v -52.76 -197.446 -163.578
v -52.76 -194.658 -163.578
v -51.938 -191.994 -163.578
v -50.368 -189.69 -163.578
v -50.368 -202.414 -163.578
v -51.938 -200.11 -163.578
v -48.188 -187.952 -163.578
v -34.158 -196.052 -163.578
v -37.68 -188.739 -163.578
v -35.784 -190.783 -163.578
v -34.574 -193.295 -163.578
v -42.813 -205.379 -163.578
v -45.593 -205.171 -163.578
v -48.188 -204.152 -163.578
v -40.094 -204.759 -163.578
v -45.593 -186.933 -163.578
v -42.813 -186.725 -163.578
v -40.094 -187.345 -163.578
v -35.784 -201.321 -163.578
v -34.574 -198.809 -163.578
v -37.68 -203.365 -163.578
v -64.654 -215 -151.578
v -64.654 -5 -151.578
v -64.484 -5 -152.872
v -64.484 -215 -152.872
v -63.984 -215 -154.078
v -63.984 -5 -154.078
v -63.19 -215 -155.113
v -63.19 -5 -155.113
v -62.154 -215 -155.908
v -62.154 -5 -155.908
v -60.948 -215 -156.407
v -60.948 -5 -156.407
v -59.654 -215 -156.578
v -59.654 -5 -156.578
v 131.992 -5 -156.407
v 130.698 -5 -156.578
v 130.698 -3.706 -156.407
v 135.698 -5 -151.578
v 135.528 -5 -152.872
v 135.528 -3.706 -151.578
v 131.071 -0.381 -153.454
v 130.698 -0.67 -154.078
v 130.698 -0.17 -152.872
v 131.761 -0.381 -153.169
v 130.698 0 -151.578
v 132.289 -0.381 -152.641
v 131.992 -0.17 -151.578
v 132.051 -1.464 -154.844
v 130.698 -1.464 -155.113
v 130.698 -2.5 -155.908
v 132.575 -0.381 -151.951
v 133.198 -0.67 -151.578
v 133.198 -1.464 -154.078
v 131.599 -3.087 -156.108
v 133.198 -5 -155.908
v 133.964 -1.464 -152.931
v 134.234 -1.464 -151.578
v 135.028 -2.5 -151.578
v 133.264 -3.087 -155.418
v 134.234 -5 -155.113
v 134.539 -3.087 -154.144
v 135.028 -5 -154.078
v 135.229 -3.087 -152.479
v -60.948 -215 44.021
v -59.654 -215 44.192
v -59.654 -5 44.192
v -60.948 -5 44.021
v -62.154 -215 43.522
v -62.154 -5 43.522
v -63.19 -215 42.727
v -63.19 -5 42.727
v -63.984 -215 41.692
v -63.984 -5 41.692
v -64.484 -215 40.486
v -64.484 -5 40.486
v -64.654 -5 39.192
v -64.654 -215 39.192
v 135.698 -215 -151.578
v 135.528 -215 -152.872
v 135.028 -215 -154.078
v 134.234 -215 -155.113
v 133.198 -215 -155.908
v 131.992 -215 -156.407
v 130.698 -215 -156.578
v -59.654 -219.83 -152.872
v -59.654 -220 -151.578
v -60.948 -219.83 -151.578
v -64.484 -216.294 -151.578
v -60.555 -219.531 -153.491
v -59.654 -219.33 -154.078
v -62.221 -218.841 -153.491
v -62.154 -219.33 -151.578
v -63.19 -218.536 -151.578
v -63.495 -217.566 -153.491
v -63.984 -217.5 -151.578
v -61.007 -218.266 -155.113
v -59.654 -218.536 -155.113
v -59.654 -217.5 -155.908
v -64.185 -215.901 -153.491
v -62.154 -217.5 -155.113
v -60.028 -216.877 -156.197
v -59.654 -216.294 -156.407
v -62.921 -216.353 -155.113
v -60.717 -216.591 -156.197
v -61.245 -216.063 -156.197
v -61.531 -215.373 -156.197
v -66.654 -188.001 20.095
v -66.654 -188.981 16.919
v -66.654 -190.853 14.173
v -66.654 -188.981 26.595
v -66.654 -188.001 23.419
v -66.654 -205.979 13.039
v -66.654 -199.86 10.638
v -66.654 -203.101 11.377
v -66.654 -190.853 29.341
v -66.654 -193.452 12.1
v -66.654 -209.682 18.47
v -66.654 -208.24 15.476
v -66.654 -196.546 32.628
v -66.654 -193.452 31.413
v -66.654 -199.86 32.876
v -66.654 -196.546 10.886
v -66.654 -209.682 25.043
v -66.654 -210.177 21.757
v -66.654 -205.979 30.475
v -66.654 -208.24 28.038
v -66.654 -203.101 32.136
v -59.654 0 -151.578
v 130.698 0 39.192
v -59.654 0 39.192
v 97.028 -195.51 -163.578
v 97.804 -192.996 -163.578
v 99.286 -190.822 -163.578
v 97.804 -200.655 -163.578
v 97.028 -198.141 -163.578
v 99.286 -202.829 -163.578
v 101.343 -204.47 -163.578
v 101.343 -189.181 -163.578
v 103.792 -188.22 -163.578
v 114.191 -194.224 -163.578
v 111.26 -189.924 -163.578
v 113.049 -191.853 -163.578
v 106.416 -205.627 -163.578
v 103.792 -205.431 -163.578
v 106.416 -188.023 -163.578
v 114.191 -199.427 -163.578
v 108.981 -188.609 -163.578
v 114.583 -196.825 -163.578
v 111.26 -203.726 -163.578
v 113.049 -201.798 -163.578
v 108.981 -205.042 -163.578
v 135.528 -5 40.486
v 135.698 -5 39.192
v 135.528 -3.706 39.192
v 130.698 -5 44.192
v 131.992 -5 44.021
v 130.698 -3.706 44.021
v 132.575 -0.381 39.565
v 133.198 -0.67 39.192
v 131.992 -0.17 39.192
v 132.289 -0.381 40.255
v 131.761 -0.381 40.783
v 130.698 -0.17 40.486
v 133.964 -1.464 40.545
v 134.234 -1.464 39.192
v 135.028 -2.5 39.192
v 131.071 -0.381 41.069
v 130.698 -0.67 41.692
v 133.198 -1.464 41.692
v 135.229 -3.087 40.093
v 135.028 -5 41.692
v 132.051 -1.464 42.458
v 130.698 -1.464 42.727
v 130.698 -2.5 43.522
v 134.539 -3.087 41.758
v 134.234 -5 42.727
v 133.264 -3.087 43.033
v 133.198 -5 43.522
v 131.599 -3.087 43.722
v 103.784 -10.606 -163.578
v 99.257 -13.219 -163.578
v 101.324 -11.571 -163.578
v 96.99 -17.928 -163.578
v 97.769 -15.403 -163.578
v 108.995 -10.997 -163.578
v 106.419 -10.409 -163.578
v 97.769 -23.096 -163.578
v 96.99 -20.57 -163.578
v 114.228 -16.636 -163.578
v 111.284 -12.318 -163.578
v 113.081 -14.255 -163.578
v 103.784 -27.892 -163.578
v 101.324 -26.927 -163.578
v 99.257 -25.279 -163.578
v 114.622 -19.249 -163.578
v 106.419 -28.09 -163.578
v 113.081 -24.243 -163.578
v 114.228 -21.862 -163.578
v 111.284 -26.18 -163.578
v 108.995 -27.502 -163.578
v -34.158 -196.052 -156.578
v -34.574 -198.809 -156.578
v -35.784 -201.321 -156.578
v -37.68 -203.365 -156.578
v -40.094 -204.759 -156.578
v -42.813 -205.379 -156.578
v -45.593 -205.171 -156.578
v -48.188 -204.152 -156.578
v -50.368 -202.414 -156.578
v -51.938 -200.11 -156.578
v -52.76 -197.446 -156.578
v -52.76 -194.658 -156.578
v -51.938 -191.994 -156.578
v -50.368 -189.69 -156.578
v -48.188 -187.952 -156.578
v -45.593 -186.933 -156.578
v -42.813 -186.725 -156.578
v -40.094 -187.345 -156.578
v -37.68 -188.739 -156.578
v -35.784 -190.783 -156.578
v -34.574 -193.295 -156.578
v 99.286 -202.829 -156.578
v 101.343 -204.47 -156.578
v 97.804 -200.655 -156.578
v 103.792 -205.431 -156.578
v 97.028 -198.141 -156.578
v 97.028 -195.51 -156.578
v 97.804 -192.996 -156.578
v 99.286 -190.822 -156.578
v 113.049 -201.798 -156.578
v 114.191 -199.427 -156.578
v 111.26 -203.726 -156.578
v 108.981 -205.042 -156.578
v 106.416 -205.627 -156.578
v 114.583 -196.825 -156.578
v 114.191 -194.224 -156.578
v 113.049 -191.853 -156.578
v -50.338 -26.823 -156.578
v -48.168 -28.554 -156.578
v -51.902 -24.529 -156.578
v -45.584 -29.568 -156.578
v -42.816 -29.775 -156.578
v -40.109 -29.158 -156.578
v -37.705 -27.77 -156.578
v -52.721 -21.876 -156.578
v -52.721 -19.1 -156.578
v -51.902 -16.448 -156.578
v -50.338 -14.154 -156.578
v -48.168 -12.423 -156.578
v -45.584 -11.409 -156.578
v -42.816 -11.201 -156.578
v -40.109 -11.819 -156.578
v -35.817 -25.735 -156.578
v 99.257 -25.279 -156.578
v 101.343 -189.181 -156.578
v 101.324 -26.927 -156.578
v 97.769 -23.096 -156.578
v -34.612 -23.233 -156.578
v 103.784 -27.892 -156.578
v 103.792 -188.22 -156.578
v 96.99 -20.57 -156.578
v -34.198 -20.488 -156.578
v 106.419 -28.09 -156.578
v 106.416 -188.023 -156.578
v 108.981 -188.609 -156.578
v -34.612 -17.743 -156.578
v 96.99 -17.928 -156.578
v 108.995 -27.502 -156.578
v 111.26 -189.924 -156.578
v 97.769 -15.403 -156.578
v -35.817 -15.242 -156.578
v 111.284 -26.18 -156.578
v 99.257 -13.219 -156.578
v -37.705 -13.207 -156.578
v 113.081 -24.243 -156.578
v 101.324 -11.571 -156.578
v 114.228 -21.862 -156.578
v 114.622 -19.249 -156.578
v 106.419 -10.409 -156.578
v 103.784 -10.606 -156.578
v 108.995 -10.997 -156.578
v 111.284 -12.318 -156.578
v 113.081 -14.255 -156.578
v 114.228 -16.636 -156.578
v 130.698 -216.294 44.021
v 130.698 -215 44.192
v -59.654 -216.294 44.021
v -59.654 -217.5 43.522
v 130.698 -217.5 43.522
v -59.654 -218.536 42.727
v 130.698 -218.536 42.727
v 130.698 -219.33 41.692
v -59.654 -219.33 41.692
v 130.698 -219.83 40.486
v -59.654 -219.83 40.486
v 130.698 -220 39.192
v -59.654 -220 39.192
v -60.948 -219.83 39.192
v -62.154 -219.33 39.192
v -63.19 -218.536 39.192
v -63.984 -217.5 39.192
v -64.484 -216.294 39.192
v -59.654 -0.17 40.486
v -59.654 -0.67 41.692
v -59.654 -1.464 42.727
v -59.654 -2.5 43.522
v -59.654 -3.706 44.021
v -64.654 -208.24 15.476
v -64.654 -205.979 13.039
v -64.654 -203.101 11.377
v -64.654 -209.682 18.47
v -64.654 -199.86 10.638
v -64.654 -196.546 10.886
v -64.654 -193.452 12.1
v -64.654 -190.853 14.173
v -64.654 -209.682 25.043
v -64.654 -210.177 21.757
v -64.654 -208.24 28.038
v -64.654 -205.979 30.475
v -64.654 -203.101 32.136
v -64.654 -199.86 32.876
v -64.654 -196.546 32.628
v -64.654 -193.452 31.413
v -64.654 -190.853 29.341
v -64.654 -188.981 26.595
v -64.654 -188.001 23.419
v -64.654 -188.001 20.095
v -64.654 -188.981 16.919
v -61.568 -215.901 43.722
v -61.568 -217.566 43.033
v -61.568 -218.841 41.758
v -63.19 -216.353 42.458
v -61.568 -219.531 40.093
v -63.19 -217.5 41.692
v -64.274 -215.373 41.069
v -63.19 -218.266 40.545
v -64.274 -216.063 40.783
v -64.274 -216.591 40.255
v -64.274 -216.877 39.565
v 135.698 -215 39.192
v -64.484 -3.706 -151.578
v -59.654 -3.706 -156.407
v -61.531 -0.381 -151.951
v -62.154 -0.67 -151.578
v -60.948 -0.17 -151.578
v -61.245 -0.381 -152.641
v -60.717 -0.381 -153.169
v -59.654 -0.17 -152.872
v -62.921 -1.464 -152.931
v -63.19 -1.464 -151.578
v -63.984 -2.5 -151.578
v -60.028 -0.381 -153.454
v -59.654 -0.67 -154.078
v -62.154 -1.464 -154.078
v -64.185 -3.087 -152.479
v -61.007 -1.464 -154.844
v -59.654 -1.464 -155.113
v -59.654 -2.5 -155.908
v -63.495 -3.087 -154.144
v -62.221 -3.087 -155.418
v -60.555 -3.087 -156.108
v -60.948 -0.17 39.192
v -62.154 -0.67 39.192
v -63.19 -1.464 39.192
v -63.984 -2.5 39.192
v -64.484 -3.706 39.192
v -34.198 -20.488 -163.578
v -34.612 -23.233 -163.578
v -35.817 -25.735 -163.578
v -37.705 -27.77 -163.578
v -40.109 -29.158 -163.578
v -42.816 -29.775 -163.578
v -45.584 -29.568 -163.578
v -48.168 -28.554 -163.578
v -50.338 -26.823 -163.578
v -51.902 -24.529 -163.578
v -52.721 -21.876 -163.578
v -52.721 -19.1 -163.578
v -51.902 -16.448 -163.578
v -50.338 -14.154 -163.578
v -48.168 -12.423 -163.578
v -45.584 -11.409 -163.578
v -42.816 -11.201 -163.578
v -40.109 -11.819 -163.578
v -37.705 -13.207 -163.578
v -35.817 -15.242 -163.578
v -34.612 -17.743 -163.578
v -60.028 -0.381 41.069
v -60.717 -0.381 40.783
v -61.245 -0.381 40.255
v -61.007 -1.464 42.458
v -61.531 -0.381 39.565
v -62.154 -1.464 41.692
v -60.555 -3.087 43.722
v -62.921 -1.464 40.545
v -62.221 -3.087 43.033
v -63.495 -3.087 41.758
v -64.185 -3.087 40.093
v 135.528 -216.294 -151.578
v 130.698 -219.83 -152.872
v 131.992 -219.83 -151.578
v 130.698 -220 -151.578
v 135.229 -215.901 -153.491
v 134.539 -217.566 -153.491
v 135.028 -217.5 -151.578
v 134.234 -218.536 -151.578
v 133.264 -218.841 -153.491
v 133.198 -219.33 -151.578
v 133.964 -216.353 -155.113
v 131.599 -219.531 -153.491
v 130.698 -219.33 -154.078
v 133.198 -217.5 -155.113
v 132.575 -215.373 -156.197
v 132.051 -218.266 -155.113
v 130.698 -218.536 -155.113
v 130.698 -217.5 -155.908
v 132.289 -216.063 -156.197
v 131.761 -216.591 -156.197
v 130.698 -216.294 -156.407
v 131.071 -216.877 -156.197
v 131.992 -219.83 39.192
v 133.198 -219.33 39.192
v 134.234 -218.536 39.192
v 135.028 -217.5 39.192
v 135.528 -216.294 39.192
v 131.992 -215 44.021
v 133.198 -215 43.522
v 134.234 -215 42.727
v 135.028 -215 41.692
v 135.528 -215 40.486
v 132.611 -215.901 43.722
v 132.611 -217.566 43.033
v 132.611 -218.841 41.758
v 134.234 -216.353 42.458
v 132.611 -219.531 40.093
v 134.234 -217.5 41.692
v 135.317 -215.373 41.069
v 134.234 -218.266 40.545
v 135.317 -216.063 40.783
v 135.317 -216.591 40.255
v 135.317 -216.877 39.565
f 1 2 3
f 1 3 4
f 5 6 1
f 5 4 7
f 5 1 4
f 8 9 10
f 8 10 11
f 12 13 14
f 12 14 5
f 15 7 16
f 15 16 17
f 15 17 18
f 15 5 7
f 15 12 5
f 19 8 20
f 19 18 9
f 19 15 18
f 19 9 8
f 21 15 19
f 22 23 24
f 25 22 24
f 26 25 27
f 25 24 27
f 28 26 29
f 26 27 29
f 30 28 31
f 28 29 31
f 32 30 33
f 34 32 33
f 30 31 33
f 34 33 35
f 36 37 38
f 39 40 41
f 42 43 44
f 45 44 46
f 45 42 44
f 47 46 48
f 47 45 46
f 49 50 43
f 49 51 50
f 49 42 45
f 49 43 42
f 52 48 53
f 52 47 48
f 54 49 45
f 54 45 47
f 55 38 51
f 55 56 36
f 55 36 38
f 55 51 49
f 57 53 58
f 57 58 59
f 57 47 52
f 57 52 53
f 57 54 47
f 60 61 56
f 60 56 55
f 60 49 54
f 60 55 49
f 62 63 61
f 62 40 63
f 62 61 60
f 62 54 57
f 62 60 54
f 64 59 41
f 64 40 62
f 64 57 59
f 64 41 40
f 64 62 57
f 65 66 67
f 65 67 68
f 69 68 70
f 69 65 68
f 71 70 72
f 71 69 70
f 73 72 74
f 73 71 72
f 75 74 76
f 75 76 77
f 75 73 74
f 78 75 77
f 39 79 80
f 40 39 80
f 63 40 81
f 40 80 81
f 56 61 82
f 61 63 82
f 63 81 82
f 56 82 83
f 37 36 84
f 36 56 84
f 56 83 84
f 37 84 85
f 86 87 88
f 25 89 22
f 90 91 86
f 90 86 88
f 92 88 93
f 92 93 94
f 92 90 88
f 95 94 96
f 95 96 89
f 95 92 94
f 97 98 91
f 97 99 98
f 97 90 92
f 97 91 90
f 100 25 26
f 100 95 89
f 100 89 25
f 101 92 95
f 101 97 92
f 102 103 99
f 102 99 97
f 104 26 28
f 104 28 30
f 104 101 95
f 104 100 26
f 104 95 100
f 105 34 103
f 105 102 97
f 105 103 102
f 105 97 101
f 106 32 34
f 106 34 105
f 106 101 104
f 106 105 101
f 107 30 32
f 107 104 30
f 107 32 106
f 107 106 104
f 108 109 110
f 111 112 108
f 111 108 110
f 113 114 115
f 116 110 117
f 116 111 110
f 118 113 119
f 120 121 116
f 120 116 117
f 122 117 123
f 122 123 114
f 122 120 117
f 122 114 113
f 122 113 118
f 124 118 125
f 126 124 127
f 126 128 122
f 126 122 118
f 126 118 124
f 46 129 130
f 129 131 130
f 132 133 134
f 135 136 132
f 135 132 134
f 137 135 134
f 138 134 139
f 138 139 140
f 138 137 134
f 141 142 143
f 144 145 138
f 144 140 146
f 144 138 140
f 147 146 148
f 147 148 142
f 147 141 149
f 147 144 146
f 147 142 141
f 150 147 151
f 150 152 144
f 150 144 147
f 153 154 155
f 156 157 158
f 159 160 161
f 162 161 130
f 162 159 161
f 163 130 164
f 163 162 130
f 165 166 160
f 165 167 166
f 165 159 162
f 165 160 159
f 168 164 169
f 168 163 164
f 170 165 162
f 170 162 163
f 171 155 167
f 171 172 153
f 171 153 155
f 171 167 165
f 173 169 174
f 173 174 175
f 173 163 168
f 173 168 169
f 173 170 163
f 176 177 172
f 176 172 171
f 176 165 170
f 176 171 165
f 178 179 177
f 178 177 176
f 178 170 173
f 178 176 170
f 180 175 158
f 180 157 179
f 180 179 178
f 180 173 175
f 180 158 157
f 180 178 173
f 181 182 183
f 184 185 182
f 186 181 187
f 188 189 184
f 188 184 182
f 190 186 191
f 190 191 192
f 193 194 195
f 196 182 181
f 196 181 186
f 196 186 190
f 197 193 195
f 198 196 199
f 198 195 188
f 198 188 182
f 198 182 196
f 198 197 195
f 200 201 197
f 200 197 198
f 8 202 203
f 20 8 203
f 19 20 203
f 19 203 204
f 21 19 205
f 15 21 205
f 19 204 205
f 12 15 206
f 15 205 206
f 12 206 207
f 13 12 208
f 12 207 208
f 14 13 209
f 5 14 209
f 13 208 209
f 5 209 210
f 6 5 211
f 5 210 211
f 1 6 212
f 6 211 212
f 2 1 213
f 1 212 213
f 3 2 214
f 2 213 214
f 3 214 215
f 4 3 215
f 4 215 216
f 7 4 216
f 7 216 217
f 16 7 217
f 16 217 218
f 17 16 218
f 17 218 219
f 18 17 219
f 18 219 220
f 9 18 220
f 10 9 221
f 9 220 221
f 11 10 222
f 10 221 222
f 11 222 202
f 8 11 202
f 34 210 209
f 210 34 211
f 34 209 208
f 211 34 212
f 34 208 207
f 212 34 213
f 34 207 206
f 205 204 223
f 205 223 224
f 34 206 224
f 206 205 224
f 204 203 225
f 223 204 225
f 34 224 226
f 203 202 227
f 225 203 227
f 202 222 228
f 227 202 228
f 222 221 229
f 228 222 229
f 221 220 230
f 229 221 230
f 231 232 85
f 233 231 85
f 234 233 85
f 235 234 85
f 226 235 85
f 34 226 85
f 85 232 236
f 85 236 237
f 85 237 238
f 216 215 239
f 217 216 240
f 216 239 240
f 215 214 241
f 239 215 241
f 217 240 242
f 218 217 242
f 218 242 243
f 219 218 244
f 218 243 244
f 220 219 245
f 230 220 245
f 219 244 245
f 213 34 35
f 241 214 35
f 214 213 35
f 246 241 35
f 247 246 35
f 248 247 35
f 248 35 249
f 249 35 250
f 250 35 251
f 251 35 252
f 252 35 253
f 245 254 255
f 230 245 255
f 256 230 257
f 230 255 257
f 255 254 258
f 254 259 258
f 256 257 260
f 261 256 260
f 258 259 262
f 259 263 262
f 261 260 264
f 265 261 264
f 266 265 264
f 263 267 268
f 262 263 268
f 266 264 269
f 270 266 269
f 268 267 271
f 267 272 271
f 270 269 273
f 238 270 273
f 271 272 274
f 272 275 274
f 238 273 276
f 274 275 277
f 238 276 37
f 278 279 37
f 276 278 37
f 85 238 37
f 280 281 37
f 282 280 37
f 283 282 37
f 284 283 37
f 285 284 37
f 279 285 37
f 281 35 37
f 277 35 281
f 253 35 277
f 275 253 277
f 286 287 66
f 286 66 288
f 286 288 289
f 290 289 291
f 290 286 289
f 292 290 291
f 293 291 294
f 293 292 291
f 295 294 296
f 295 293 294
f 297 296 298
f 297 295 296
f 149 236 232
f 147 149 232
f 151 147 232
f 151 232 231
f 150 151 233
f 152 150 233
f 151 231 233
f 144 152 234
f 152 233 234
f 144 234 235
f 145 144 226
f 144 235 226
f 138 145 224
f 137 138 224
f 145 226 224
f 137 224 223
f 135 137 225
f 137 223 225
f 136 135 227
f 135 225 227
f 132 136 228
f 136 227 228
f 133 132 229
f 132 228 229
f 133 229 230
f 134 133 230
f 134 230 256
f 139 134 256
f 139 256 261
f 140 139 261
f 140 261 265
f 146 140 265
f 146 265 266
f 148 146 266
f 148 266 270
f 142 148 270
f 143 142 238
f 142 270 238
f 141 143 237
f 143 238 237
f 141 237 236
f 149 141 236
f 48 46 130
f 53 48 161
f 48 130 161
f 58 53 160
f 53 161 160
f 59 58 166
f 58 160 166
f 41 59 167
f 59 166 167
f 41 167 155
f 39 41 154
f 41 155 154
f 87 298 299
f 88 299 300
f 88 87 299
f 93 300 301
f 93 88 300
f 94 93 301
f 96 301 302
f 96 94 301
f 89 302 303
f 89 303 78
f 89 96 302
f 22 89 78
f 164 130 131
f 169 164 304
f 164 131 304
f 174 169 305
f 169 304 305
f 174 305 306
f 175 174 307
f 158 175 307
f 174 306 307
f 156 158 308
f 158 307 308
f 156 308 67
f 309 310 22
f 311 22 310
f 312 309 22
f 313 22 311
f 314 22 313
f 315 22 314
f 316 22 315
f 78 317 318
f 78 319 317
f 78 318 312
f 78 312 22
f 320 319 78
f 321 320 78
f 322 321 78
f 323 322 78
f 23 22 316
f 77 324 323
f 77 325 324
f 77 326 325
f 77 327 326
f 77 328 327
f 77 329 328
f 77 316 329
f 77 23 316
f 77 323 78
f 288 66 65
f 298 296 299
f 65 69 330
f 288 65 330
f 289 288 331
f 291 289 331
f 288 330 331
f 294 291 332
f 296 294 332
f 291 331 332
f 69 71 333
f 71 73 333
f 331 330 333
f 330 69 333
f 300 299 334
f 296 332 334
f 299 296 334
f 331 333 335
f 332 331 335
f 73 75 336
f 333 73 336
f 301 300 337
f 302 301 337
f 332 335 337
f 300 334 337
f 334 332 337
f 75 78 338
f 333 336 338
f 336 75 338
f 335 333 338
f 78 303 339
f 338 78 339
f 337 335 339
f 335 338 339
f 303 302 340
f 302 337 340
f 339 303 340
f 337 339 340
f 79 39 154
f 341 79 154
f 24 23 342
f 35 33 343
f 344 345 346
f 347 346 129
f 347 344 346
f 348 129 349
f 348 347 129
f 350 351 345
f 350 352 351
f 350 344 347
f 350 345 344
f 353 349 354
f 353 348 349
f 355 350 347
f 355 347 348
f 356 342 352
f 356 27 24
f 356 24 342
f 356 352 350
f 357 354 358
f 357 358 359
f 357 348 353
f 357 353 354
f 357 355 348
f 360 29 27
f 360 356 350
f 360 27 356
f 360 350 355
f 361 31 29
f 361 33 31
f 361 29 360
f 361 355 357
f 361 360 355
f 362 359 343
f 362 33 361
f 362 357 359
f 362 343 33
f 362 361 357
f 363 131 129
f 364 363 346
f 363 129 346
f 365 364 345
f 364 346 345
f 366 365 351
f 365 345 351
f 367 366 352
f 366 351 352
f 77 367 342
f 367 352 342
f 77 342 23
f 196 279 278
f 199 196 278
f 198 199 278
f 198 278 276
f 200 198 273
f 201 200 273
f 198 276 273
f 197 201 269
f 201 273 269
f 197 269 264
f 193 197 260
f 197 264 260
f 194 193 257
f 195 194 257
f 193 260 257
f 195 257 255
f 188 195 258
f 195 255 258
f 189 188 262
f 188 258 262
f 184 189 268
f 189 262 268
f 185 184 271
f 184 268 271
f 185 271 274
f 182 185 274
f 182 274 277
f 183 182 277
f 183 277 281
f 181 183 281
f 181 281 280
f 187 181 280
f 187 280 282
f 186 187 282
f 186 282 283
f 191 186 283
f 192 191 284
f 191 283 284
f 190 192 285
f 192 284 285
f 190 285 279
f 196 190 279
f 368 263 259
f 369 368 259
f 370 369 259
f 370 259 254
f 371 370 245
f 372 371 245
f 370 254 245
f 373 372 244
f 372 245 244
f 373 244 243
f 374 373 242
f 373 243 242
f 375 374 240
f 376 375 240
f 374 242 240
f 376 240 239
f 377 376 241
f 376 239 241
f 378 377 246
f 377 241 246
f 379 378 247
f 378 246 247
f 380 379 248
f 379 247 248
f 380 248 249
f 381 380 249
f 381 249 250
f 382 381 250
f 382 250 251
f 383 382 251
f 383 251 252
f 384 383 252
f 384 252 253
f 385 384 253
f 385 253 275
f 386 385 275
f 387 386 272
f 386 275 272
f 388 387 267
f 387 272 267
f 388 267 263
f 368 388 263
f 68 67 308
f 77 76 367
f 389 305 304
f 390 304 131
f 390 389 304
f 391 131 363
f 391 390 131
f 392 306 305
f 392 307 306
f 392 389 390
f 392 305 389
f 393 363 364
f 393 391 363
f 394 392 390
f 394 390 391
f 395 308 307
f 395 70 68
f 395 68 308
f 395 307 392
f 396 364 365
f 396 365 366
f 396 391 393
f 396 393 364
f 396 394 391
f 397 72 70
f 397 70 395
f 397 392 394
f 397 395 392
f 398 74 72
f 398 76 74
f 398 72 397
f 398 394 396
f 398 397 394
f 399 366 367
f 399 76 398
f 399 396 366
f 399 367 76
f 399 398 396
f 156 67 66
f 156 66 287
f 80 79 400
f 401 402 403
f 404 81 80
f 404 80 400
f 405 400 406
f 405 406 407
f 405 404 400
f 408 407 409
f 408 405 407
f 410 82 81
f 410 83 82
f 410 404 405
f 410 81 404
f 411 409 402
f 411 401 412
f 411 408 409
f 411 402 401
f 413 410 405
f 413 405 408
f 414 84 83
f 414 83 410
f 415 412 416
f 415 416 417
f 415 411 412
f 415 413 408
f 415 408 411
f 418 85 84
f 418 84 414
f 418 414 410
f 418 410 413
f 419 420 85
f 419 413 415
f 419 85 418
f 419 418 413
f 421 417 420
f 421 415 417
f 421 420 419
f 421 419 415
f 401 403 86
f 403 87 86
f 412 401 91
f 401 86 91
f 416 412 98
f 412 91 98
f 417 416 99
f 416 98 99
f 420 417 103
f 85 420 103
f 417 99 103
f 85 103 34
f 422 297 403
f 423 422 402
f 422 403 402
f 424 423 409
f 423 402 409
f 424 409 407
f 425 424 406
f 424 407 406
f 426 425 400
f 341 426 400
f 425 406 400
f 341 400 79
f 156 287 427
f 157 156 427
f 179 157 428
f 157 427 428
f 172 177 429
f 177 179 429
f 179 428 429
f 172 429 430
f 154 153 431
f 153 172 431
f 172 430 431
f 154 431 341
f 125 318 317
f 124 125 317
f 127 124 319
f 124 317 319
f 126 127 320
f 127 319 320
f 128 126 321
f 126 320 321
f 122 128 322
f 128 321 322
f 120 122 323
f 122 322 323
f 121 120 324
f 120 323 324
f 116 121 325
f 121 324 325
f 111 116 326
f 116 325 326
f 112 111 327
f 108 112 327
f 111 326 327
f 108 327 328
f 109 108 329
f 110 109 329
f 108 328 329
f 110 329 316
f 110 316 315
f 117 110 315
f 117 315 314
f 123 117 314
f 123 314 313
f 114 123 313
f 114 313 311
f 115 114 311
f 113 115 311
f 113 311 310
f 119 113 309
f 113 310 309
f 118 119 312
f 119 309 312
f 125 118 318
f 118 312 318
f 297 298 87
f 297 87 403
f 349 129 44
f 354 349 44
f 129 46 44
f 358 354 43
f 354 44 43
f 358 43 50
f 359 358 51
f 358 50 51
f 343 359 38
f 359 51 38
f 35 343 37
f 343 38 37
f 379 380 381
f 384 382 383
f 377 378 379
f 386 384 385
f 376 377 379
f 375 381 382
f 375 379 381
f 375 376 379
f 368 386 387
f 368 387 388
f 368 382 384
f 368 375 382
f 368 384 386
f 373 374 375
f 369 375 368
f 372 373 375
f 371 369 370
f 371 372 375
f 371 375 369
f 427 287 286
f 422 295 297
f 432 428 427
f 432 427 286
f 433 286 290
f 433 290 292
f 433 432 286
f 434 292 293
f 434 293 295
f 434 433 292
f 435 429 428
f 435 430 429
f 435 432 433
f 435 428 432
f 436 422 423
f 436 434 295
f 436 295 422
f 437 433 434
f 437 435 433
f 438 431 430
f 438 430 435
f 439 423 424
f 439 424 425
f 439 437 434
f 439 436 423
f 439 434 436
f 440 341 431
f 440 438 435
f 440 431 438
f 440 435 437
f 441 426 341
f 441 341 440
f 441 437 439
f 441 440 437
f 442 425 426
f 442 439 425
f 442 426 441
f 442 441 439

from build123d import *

# Parameters (mm, degrees)
F0_W      = 200.3522217274
F0_H      = 200.7694281638
F1_DEPTH  = 220
F2_W      = 106.5517105162
F2_H      = 12.7497781068
F3_DEPTH  = 15
F4_R      = 5
F5_R      = 5
F6_R      = 5
F8_R      = 5
F9_R      = 5
F12_DEPTH = 6.66
F14_R     = 8.8266857578
F14_R_2   = 8.8654347792
F14_R_3   = 9.3130675206
F14_R_4   = 9.3531300043
F15_DEPTH = 7
F7_R      = 11.1504231151
F18_DEPTH = 2


# Not quite as in the source:
# - the program builds the solid bodies; features that only make, move or delete a surface that nothing else refers to are left out


with BuildPart() as f1:
    # F0 (on Front) → F1 (new body)
    with BuildSketch(Plane.XZ):
        with Locations((35.5218797922, -56.1928581446)):
            Rectangle(F0_W, F0_H)
    extrude(amount=F1_DEPTH)

    # F2 (on face) → F3 (join)
    with BuildSketch(Plane.XZ.offset(220)):
        with Locations((33.8400062174, 20.9869192913)):
            Rectangle(F2_W, F2_H)
    extrude(amount=-F3_DEPTH)

    # F4
    f4_edges = [f1.edges().sort_by_distance(p)[0] for p in [
        (35.52188, -220, 44.191856),
    ]]
    fillet(f4_edges, radius=F4_R)

    # F5
    f5_edges = [f1.edges().sort_by_distance(p)[0] for p in [
        (135.697991, -218.535534, 42.72739),
    ]]
    fillet(f5_edges, radius=F5_R)

    # F6
    f6_edges = [f1.edges().sort_by_distance(p)[0] for p in [
        (-64.654231, -218.535534, 42.72739),
    ]]
    fillet(f6_edges, radius=F6_R)

    # F8
    f8_edges = [f1.edges().sort_by_distance(p)[0] for p in [
        (135.697991, -107.5, -156.577572),
        (35.52188, -220, -156.577572),
        (-64.654231, -107.5, -156.577572),
    ]]
    fillet(f8_edges, radius=F8_R)

    # F9
    f9_edges = [f1.edges().sort_by_distance(p)[0] for p in [
        (35.52188, 0, -156.577572),
    ]]
    fillet(f9_edges, radius=F9_R)

    # F2 (on face) → F12 (join)
    with BuildSketch(Plane.XZ.offset(220)):
        with Locations((33.8400062174, 20.9869192913)):
            Rectangle(F2_W, F2_H)
    extrude(amount=-F12_DEPTH)

    # F14 (on face) → F15 (join)
    with BuildSketch(Plane(origin=(0, 0, -156.5775722265), x_dir=(1, 0, 0), z_dir=(0, 0, -1))):
        with Locations((105.7562977076, 196.8253701925)):
            Circle(F14_R)
        with Locations((105.7562977076, 19.2491486669)):
            Circle(F14_R_2)
        with Locations((-43.5114949942, 20.4882938415)):
            Circle(F14_R_3)
        with Locations((-43.5114949942, 196.0519701242)):
            Circle(F14_R_4)
    extrude(amount=F15_DEPTH)

    # F7 (on face) → F18 (join)
    with BuildSketch(Plane(origin=(-64.6542310715, 0, 0), x_dir=(0, -1, 0), z_dir=(-1, 0, 0))):
        with Locations((199.0269720554, 21.7568427324)):
            Circle(F7_R)
    extrude(amount=F18_DEPTH)


solid = f1.part
